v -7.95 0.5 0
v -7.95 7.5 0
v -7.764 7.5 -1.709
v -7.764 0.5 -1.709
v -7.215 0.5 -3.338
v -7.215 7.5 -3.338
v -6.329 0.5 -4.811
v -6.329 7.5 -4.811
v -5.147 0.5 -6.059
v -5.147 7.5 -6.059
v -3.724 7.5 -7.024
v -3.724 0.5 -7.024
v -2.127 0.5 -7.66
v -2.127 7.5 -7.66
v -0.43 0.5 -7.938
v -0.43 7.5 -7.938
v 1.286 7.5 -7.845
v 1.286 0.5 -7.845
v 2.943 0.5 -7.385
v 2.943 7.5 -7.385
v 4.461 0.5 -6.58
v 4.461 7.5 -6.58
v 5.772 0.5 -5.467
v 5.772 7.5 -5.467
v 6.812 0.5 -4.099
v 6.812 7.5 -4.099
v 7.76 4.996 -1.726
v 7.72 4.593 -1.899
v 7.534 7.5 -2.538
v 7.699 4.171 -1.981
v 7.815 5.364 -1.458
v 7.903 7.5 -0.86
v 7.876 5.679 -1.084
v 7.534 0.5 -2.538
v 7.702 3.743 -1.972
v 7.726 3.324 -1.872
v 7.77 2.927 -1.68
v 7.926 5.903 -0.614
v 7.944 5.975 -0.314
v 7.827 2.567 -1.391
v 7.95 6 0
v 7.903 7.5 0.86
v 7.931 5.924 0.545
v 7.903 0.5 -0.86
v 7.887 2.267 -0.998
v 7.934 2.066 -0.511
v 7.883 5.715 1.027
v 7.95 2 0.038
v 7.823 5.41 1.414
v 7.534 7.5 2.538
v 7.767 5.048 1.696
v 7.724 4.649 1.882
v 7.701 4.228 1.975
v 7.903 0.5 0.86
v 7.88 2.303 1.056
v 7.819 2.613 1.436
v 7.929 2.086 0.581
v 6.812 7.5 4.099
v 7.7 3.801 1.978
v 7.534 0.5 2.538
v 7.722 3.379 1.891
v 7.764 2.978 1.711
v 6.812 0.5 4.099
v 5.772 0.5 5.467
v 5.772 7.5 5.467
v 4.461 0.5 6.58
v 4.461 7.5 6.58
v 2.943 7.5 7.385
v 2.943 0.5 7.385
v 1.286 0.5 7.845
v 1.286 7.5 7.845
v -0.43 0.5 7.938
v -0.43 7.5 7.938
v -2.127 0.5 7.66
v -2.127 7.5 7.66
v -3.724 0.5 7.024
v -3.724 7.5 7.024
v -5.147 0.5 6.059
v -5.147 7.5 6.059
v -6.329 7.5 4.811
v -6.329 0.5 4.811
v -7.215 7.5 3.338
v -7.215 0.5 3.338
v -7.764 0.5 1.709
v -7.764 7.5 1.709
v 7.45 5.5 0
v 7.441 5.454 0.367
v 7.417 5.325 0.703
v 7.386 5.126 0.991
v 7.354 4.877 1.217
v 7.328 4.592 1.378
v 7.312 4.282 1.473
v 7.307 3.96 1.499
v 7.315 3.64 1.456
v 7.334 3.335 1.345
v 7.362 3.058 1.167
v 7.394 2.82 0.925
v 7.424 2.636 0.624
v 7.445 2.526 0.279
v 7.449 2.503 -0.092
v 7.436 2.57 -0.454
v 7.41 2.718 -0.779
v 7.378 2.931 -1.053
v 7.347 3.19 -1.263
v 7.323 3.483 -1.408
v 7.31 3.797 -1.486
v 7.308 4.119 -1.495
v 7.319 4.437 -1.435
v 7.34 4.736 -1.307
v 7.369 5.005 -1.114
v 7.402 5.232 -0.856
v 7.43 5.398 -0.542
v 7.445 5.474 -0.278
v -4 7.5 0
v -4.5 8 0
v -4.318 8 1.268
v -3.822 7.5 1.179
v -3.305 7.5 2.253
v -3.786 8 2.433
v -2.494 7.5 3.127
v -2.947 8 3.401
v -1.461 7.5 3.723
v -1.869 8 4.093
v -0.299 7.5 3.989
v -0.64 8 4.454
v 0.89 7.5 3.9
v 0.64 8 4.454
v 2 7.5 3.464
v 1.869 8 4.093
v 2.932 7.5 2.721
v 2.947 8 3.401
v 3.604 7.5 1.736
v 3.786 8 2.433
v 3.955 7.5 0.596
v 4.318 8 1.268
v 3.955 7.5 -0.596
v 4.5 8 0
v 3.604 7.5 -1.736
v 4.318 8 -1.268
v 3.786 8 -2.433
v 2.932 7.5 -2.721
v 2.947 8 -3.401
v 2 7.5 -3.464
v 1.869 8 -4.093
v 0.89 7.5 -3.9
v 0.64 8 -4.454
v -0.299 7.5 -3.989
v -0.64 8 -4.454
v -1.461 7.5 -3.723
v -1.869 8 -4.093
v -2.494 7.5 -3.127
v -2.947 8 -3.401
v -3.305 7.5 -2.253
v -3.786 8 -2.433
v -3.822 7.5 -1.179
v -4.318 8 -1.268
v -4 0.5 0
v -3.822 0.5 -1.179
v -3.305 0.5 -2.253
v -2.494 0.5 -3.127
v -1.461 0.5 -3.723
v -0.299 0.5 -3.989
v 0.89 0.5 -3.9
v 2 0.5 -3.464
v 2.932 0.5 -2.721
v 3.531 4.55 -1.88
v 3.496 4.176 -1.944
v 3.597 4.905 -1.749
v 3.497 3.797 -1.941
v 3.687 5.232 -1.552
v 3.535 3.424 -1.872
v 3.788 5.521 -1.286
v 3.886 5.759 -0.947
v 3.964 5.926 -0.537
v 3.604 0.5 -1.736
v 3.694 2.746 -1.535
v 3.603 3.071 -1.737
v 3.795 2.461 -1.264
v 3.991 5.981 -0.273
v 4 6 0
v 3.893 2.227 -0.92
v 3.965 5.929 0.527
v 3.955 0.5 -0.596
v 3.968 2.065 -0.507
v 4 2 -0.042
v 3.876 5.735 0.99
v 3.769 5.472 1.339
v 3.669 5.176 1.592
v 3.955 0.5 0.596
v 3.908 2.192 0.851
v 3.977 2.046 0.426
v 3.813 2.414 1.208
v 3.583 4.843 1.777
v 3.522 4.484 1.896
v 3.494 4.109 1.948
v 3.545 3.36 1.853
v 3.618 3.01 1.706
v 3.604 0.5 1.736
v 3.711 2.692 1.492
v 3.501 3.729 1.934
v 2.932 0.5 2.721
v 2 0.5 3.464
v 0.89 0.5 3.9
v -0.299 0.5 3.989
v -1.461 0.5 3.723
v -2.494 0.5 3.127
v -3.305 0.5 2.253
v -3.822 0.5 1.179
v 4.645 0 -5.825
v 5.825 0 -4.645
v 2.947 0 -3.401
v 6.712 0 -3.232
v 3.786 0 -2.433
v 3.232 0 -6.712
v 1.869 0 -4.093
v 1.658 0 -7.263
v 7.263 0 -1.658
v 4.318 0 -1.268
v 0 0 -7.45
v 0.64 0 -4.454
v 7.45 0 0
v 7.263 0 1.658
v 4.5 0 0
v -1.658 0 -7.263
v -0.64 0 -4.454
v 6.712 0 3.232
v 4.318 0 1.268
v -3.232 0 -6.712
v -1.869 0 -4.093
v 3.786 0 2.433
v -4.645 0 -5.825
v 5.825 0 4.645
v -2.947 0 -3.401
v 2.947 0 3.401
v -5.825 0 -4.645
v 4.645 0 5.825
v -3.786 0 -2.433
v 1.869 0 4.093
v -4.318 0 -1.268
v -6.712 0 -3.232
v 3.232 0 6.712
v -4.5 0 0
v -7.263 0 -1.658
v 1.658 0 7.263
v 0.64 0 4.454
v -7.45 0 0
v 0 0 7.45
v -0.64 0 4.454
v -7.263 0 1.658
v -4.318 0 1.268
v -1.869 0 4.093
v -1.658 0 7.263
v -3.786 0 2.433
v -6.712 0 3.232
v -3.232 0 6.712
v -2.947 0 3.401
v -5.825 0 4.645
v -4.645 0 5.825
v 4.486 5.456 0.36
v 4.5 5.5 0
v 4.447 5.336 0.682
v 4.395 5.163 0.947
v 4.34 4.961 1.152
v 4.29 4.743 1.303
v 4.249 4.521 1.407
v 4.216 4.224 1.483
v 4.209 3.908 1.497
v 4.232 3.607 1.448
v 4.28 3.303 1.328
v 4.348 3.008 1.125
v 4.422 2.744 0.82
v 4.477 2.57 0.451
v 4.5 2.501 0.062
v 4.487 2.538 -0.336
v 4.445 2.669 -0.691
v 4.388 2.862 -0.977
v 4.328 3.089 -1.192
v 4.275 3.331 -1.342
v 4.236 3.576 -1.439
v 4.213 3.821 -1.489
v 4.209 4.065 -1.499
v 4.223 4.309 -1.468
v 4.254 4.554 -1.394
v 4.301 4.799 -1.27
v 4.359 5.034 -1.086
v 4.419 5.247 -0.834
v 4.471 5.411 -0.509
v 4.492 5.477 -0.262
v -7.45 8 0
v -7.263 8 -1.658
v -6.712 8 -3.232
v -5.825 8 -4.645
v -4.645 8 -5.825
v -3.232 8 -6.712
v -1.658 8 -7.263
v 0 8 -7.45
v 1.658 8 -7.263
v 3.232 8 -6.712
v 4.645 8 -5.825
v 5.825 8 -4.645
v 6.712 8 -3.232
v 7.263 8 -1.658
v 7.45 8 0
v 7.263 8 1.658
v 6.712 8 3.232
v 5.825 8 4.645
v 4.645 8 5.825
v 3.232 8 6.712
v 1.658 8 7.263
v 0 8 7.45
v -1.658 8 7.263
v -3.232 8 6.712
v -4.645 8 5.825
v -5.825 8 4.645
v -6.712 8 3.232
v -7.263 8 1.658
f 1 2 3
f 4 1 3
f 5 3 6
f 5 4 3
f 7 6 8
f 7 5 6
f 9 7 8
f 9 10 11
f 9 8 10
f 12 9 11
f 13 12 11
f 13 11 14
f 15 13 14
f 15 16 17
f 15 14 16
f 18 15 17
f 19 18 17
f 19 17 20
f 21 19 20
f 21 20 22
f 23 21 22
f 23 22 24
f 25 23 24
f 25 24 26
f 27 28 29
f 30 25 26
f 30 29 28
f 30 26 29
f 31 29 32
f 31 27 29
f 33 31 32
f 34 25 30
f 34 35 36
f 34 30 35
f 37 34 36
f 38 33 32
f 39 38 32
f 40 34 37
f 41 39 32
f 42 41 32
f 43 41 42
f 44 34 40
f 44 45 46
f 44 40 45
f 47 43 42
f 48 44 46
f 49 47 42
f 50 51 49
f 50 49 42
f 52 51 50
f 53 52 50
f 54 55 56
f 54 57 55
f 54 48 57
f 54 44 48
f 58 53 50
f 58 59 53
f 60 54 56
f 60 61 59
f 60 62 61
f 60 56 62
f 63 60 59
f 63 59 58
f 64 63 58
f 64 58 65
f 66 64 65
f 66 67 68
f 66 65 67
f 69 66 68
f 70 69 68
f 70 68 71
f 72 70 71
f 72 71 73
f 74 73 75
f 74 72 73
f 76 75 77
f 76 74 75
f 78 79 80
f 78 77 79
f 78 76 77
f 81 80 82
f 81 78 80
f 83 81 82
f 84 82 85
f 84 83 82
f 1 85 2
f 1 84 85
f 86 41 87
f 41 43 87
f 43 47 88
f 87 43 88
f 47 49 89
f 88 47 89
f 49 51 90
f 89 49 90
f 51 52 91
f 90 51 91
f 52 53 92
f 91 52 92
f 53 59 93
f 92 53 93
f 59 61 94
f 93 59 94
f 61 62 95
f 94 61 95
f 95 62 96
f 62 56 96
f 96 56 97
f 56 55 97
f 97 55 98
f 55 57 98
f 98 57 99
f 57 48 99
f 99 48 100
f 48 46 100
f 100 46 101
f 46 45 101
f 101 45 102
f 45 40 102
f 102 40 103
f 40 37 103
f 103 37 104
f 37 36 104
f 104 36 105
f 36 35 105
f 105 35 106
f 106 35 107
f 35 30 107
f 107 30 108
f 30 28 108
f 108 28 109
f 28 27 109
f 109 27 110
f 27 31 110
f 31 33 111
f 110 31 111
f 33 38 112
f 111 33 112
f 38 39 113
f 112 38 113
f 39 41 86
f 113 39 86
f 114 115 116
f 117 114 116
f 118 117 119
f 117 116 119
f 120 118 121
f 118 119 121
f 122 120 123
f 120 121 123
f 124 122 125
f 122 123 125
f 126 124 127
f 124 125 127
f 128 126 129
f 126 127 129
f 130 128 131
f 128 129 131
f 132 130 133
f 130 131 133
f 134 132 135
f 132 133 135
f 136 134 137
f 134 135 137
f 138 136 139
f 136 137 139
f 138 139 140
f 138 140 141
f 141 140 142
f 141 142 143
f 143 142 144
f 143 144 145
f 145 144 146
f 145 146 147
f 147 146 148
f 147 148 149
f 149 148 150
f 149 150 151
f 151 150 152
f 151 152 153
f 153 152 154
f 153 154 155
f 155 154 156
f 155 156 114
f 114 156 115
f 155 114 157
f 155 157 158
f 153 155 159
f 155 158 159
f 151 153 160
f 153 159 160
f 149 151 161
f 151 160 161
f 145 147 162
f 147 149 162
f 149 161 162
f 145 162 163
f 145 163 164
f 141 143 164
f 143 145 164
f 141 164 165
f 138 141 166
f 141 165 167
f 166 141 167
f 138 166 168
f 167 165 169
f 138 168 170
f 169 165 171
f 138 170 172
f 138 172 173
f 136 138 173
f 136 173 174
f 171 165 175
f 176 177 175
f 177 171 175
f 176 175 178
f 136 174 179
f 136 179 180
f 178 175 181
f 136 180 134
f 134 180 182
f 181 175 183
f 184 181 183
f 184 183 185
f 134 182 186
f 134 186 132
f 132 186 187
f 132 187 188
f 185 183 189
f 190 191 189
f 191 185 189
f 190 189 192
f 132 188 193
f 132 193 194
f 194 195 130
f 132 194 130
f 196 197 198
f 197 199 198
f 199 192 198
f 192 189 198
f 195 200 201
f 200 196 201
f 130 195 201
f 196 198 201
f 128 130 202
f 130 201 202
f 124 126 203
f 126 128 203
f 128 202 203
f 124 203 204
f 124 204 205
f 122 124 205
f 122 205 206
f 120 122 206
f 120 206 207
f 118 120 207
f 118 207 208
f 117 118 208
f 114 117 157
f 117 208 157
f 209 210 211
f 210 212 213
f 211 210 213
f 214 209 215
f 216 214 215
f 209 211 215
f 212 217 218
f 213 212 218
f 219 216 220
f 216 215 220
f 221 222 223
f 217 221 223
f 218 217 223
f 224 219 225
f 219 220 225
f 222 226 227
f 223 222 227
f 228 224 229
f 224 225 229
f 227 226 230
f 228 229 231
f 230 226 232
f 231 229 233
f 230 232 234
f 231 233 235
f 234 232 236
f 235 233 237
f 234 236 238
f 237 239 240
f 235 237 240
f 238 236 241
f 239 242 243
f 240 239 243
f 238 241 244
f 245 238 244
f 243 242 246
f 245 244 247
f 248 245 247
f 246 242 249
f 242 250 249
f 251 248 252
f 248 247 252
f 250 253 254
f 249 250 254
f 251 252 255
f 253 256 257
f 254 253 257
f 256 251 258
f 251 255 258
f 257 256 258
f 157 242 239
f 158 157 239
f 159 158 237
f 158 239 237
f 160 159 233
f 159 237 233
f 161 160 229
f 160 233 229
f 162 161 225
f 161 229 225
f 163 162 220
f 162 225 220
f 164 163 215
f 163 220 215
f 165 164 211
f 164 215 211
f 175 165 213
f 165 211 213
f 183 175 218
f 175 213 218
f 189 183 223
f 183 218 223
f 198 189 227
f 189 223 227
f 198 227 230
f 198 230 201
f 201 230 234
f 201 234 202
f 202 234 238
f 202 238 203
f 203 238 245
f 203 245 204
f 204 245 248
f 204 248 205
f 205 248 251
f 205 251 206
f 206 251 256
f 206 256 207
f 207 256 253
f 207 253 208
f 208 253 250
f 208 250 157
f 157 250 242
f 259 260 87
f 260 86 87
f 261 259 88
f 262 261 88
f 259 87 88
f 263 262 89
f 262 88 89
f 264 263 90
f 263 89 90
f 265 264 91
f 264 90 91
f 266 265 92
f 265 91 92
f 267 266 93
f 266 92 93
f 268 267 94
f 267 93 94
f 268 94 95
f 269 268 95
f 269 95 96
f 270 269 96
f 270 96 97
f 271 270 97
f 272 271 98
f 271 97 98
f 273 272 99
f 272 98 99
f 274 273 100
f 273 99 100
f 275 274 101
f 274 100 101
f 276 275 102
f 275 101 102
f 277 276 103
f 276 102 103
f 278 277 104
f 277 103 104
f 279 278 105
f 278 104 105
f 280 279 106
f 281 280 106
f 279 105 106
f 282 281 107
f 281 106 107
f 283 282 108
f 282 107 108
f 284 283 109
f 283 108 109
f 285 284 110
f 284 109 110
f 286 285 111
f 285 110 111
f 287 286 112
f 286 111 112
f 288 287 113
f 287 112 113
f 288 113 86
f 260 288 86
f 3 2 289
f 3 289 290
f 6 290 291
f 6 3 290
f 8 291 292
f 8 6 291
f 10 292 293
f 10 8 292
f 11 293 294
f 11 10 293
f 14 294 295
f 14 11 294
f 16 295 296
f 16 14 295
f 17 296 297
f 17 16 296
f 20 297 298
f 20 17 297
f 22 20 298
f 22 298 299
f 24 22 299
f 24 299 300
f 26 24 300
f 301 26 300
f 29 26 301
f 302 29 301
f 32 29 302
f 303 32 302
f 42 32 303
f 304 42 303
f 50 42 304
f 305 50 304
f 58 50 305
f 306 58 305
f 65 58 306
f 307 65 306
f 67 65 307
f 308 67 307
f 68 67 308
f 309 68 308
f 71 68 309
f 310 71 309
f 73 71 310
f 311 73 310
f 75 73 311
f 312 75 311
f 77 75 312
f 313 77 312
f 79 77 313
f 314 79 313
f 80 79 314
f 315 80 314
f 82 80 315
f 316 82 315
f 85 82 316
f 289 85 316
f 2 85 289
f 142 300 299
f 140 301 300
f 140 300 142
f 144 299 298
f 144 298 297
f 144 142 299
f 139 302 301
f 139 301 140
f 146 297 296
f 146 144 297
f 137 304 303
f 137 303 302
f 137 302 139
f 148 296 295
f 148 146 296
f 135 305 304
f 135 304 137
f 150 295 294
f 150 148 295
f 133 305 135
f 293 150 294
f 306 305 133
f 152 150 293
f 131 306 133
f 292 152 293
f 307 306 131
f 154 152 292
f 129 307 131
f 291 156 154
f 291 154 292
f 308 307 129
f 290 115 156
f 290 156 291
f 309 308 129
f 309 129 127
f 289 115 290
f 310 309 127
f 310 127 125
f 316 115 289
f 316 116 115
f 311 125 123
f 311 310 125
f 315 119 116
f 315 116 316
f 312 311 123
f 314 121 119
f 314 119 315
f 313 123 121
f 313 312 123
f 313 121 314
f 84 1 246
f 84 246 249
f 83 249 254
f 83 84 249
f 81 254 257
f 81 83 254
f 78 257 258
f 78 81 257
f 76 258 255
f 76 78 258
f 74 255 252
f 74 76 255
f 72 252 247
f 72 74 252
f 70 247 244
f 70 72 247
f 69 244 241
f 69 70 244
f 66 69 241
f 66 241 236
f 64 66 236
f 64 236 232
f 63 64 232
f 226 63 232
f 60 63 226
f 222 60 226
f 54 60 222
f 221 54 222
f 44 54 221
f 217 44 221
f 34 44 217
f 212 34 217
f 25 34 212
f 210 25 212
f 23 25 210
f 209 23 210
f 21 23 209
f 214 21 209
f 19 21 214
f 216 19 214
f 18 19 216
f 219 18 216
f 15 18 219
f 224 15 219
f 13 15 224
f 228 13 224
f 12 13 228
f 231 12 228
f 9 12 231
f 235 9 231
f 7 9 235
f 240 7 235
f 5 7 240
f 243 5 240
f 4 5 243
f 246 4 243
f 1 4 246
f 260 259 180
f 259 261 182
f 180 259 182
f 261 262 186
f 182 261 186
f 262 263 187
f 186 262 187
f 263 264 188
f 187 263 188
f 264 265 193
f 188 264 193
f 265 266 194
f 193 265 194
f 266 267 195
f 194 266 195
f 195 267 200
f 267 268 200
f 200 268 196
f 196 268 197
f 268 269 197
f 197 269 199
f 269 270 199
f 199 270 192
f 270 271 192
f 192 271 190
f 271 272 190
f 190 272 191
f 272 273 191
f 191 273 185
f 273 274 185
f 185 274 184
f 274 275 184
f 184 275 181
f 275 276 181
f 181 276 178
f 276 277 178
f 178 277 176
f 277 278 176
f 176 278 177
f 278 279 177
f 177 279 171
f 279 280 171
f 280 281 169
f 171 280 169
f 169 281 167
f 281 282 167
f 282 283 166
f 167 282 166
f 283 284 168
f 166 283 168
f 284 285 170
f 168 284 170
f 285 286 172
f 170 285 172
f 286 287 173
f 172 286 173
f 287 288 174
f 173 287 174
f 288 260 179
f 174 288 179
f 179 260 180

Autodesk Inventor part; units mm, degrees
ref_plane "XZ Plane" through (0, 0, 0) normal (0, 1, 0) x (-1, 0, 0)
ref_plane "XY Plane" through (0, 0, 0) normal (0, 0, 1) x (1, 0, 0)
sketch "Sketch1" plane through (0, 0, 0) normal (0, 1, 0) x (-1, 0, 0)
  circle A0 centre (0, 0) radius 4
  circle A1 centre (0, 0) radius 7.95
  dimension "d0" = 8
  dimension "d1" = 15.9
extrude "Extrusion1" add sketch "Sketch1" along normal blind 8
ref_plane "Work Plane1" through (7.95, 0, 0) normal (1, 0, 0) x (0, 1, 0)
sketch "Sketch2" plane through (7.95, 0, 0) normal (1, 0, 0) x (0, 1, 0)
  circle A0 centre (4, 0) radius 1.5
  line L0 (0, -7.95) -> (0, 7.95) projected
  line L1 (8, -7.95) -> (8, 7.95) projected
  point P0 (0, 0)
  dimension "d4" = 3
  dimension "d5" = 8
  dimension "d6" = 4
extrude "Extrusion2" cut sketch "Sketch2" against normal up to surface
thread "Thread1" size "M3x0.5" class "6H" standard "ANSI Metric M Profile" full length
chamfer "Chamfer1" distance 0.5 angle 45 7 edges at (7.95, 8, 0) (4, 8, 0) (7.95, 0, 0) (4, 0, 0) (4, 2.5, -0.0003) (7.8072, 3.9998, -1.5) (7.8072, 4.0001, 1.5)
equation "\"d6\" = 0.5 * d5"
properties part number "stelring - 8mm" material "Stainless Steel"
